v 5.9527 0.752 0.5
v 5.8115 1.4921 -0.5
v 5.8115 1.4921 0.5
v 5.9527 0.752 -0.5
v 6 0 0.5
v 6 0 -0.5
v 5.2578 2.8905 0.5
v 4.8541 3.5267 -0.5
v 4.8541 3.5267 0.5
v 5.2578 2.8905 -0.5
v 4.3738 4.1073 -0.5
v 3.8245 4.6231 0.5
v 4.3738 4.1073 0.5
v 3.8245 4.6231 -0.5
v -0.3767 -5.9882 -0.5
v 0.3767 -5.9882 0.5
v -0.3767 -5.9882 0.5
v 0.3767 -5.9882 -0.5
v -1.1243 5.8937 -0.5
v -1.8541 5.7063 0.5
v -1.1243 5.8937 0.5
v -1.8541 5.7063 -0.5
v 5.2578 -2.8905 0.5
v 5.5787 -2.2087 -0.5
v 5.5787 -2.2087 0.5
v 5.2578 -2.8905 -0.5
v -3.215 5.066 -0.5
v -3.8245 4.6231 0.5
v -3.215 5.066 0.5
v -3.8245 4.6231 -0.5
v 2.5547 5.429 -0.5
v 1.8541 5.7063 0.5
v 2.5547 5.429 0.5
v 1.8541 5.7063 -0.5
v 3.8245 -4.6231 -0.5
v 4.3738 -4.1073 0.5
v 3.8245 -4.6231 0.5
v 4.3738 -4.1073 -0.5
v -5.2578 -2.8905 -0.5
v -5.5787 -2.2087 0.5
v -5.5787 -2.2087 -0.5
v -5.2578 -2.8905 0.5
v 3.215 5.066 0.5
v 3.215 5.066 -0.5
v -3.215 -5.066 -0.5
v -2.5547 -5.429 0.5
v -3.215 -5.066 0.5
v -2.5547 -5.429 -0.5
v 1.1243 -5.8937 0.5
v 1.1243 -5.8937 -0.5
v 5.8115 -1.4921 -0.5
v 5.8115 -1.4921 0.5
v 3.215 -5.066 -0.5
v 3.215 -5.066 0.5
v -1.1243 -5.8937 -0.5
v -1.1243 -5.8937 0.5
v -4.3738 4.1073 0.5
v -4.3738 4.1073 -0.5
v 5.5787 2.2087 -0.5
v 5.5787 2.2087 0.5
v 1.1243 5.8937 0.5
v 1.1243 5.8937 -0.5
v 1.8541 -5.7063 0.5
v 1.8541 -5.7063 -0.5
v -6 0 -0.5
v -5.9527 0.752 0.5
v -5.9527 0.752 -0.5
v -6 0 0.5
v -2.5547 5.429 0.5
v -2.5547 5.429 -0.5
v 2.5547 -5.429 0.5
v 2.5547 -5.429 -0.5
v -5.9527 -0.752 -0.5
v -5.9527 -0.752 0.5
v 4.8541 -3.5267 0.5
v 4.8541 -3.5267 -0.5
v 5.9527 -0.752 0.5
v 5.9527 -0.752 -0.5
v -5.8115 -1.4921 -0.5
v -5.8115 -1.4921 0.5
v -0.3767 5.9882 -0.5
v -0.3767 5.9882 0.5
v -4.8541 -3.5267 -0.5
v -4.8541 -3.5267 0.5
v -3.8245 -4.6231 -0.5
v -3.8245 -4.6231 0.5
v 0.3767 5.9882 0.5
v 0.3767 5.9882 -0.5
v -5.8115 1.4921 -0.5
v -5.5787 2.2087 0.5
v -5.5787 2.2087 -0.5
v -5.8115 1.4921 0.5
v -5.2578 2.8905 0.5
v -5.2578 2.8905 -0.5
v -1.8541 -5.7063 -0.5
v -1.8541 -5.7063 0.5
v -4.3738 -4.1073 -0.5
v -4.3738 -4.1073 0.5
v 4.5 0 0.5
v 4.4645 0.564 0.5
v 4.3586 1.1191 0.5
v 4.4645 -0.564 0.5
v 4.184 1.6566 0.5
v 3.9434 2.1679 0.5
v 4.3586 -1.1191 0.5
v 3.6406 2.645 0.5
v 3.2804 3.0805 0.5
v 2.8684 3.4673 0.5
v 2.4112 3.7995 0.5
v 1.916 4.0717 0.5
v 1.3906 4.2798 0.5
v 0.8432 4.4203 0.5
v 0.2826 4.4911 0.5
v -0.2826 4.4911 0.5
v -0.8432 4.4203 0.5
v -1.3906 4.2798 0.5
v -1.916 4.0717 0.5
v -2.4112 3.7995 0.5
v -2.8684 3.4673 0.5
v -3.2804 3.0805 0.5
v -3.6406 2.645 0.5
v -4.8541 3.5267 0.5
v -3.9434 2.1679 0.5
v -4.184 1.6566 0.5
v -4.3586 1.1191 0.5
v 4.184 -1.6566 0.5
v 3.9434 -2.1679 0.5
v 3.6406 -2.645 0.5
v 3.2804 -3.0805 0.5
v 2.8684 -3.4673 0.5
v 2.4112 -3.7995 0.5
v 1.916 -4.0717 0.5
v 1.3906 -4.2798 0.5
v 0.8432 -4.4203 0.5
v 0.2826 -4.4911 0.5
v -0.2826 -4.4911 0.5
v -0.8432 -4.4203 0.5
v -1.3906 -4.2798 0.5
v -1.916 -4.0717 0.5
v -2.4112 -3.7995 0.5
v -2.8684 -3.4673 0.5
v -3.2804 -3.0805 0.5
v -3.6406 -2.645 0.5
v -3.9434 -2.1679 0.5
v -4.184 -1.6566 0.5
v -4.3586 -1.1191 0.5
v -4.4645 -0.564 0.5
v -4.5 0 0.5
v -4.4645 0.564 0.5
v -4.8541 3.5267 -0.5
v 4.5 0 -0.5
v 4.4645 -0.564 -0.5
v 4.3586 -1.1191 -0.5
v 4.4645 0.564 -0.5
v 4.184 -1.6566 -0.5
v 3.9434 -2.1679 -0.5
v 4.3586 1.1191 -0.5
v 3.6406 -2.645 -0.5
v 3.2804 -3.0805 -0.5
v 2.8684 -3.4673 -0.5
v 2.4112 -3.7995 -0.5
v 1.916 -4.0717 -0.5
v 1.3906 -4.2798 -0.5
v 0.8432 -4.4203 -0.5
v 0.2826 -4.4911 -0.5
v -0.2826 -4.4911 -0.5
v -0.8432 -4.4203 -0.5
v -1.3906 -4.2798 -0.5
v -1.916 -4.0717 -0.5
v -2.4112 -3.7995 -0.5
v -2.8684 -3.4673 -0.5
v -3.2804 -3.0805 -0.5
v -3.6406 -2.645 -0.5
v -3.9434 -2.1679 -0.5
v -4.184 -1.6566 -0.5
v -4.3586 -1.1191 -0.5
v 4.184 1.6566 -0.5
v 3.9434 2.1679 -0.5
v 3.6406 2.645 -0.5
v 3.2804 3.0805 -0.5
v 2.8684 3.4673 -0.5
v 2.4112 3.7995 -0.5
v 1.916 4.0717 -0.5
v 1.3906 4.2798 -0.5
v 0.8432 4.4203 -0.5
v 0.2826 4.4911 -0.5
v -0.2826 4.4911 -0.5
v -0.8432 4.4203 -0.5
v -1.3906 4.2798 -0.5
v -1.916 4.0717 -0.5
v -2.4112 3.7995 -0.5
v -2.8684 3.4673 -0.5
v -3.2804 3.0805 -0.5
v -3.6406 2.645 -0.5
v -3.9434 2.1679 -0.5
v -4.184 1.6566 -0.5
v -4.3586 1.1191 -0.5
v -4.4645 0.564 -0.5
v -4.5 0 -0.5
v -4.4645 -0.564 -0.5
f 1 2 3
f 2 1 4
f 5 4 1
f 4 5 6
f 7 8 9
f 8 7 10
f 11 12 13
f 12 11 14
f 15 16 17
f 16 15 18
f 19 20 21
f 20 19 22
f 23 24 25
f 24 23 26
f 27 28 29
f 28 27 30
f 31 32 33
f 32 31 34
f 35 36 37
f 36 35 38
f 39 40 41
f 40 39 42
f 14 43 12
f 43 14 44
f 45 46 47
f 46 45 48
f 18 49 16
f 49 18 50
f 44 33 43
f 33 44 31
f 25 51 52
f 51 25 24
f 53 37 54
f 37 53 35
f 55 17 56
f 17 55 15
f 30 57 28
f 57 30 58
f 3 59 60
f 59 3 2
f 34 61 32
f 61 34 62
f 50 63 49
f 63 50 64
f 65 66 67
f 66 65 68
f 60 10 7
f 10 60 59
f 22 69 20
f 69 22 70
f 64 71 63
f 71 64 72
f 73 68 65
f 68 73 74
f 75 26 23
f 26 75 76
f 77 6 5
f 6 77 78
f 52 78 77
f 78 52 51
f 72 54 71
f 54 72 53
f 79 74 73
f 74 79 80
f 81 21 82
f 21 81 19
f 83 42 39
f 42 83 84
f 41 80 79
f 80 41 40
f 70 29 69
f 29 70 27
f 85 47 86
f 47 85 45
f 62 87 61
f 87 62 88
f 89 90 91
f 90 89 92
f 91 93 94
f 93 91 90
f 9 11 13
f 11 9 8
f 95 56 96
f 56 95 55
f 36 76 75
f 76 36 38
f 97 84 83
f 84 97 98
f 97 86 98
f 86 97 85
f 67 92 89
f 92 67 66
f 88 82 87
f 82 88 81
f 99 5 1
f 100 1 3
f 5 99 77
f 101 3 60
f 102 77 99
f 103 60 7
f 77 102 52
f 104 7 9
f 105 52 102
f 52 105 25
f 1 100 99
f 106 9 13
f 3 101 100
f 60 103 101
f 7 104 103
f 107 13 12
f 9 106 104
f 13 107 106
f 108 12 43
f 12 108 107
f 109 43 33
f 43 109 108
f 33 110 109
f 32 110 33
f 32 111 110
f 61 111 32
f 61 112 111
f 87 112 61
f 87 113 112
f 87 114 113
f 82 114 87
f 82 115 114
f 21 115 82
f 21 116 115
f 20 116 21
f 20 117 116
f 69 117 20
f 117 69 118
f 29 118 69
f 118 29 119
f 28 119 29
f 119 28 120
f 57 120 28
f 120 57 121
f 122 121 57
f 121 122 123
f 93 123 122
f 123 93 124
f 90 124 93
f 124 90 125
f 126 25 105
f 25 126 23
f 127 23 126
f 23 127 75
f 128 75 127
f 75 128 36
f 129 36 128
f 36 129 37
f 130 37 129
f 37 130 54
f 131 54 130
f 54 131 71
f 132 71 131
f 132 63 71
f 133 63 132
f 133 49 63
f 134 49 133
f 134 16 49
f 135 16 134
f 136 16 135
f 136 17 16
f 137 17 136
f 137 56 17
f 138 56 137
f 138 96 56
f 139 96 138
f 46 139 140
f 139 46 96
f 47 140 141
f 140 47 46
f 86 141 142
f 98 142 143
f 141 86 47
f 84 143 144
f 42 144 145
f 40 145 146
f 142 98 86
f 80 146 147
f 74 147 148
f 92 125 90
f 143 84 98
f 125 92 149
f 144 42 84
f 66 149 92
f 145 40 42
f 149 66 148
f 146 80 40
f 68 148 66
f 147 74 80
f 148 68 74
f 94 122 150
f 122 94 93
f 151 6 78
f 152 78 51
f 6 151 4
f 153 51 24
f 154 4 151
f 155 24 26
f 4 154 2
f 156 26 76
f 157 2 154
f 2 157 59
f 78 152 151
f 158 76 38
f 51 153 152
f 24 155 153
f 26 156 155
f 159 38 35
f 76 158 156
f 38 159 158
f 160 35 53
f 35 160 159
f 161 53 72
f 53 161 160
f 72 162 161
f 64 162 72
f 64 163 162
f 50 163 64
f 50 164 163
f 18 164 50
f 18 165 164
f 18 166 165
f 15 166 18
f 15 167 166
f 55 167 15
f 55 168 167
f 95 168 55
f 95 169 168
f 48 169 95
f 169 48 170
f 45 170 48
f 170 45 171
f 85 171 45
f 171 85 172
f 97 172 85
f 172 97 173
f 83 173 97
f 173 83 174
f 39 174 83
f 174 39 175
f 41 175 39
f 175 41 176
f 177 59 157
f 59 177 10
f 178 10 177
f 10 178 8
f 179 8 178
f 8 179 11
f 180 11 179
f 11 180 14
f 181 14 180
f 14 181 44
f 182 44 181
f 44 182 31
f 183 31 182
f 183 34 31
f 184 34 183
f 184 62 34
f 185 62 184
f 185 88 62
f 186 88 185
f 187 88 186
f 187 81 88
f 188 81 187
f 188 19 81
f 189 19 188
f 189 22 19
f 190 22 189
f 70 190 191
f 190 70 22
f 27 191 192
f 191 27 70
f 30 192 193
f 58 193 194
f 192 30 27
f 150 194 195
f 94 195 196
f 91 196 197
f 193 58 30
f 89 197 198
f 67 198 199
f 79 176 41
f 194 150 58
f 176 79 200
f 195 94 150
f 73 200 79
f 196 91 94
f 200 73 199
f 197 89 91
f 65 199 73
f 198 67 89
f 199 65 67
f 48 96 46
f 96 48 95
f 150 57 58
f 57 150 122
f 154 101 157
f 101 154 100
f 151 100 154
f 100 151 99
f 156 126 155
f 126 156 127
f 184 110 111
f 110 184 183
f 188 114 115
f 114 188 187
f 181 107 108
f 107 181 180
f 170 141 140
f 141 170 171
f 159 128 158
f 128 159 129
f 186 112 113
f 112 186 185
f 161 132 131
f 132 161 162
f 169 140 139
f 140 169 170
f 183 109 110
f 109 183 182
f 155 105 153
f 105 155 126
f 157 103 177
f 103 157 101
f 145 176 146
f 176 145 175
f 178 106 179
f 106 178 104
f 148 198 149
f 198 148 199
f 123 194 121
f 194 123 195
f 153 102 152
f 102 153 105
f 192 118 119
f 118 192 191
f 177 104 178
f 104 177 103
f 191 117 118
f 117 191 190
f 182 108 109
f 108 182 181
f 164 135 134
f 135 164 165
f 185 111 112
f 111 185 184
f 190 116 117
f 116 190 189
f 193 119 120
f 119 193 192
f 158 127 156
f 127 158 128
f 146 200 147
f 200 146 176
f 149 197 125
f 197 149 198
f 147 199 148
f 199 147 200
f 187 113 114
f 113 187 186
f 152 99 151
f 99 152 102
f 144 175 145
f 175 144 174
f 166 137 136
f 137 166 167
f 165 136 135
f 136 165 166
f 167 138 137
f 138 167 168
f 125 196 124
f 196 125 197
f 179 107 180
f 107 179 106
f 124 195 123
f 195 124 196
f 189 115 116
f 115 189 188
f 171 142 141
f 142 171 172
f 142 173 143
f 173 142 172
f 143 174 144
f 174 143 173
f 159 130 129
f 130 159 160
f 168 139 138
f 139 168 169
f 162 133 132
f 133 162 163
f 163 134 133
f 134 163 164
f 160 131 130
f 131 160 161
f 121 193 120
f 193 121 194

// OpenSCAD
$fn = 50;


difference() {
	union() {
		translate(v = [0, 0, -0.5000000000]) {
			cylinder(h = 1, r = 6.0000000000);
		}
	}
	union() {
		translate(v = [0, 0, -100.0000000000]) {
			cylinder(h = 200, r = 4.5000000000);
		}
	}
}
